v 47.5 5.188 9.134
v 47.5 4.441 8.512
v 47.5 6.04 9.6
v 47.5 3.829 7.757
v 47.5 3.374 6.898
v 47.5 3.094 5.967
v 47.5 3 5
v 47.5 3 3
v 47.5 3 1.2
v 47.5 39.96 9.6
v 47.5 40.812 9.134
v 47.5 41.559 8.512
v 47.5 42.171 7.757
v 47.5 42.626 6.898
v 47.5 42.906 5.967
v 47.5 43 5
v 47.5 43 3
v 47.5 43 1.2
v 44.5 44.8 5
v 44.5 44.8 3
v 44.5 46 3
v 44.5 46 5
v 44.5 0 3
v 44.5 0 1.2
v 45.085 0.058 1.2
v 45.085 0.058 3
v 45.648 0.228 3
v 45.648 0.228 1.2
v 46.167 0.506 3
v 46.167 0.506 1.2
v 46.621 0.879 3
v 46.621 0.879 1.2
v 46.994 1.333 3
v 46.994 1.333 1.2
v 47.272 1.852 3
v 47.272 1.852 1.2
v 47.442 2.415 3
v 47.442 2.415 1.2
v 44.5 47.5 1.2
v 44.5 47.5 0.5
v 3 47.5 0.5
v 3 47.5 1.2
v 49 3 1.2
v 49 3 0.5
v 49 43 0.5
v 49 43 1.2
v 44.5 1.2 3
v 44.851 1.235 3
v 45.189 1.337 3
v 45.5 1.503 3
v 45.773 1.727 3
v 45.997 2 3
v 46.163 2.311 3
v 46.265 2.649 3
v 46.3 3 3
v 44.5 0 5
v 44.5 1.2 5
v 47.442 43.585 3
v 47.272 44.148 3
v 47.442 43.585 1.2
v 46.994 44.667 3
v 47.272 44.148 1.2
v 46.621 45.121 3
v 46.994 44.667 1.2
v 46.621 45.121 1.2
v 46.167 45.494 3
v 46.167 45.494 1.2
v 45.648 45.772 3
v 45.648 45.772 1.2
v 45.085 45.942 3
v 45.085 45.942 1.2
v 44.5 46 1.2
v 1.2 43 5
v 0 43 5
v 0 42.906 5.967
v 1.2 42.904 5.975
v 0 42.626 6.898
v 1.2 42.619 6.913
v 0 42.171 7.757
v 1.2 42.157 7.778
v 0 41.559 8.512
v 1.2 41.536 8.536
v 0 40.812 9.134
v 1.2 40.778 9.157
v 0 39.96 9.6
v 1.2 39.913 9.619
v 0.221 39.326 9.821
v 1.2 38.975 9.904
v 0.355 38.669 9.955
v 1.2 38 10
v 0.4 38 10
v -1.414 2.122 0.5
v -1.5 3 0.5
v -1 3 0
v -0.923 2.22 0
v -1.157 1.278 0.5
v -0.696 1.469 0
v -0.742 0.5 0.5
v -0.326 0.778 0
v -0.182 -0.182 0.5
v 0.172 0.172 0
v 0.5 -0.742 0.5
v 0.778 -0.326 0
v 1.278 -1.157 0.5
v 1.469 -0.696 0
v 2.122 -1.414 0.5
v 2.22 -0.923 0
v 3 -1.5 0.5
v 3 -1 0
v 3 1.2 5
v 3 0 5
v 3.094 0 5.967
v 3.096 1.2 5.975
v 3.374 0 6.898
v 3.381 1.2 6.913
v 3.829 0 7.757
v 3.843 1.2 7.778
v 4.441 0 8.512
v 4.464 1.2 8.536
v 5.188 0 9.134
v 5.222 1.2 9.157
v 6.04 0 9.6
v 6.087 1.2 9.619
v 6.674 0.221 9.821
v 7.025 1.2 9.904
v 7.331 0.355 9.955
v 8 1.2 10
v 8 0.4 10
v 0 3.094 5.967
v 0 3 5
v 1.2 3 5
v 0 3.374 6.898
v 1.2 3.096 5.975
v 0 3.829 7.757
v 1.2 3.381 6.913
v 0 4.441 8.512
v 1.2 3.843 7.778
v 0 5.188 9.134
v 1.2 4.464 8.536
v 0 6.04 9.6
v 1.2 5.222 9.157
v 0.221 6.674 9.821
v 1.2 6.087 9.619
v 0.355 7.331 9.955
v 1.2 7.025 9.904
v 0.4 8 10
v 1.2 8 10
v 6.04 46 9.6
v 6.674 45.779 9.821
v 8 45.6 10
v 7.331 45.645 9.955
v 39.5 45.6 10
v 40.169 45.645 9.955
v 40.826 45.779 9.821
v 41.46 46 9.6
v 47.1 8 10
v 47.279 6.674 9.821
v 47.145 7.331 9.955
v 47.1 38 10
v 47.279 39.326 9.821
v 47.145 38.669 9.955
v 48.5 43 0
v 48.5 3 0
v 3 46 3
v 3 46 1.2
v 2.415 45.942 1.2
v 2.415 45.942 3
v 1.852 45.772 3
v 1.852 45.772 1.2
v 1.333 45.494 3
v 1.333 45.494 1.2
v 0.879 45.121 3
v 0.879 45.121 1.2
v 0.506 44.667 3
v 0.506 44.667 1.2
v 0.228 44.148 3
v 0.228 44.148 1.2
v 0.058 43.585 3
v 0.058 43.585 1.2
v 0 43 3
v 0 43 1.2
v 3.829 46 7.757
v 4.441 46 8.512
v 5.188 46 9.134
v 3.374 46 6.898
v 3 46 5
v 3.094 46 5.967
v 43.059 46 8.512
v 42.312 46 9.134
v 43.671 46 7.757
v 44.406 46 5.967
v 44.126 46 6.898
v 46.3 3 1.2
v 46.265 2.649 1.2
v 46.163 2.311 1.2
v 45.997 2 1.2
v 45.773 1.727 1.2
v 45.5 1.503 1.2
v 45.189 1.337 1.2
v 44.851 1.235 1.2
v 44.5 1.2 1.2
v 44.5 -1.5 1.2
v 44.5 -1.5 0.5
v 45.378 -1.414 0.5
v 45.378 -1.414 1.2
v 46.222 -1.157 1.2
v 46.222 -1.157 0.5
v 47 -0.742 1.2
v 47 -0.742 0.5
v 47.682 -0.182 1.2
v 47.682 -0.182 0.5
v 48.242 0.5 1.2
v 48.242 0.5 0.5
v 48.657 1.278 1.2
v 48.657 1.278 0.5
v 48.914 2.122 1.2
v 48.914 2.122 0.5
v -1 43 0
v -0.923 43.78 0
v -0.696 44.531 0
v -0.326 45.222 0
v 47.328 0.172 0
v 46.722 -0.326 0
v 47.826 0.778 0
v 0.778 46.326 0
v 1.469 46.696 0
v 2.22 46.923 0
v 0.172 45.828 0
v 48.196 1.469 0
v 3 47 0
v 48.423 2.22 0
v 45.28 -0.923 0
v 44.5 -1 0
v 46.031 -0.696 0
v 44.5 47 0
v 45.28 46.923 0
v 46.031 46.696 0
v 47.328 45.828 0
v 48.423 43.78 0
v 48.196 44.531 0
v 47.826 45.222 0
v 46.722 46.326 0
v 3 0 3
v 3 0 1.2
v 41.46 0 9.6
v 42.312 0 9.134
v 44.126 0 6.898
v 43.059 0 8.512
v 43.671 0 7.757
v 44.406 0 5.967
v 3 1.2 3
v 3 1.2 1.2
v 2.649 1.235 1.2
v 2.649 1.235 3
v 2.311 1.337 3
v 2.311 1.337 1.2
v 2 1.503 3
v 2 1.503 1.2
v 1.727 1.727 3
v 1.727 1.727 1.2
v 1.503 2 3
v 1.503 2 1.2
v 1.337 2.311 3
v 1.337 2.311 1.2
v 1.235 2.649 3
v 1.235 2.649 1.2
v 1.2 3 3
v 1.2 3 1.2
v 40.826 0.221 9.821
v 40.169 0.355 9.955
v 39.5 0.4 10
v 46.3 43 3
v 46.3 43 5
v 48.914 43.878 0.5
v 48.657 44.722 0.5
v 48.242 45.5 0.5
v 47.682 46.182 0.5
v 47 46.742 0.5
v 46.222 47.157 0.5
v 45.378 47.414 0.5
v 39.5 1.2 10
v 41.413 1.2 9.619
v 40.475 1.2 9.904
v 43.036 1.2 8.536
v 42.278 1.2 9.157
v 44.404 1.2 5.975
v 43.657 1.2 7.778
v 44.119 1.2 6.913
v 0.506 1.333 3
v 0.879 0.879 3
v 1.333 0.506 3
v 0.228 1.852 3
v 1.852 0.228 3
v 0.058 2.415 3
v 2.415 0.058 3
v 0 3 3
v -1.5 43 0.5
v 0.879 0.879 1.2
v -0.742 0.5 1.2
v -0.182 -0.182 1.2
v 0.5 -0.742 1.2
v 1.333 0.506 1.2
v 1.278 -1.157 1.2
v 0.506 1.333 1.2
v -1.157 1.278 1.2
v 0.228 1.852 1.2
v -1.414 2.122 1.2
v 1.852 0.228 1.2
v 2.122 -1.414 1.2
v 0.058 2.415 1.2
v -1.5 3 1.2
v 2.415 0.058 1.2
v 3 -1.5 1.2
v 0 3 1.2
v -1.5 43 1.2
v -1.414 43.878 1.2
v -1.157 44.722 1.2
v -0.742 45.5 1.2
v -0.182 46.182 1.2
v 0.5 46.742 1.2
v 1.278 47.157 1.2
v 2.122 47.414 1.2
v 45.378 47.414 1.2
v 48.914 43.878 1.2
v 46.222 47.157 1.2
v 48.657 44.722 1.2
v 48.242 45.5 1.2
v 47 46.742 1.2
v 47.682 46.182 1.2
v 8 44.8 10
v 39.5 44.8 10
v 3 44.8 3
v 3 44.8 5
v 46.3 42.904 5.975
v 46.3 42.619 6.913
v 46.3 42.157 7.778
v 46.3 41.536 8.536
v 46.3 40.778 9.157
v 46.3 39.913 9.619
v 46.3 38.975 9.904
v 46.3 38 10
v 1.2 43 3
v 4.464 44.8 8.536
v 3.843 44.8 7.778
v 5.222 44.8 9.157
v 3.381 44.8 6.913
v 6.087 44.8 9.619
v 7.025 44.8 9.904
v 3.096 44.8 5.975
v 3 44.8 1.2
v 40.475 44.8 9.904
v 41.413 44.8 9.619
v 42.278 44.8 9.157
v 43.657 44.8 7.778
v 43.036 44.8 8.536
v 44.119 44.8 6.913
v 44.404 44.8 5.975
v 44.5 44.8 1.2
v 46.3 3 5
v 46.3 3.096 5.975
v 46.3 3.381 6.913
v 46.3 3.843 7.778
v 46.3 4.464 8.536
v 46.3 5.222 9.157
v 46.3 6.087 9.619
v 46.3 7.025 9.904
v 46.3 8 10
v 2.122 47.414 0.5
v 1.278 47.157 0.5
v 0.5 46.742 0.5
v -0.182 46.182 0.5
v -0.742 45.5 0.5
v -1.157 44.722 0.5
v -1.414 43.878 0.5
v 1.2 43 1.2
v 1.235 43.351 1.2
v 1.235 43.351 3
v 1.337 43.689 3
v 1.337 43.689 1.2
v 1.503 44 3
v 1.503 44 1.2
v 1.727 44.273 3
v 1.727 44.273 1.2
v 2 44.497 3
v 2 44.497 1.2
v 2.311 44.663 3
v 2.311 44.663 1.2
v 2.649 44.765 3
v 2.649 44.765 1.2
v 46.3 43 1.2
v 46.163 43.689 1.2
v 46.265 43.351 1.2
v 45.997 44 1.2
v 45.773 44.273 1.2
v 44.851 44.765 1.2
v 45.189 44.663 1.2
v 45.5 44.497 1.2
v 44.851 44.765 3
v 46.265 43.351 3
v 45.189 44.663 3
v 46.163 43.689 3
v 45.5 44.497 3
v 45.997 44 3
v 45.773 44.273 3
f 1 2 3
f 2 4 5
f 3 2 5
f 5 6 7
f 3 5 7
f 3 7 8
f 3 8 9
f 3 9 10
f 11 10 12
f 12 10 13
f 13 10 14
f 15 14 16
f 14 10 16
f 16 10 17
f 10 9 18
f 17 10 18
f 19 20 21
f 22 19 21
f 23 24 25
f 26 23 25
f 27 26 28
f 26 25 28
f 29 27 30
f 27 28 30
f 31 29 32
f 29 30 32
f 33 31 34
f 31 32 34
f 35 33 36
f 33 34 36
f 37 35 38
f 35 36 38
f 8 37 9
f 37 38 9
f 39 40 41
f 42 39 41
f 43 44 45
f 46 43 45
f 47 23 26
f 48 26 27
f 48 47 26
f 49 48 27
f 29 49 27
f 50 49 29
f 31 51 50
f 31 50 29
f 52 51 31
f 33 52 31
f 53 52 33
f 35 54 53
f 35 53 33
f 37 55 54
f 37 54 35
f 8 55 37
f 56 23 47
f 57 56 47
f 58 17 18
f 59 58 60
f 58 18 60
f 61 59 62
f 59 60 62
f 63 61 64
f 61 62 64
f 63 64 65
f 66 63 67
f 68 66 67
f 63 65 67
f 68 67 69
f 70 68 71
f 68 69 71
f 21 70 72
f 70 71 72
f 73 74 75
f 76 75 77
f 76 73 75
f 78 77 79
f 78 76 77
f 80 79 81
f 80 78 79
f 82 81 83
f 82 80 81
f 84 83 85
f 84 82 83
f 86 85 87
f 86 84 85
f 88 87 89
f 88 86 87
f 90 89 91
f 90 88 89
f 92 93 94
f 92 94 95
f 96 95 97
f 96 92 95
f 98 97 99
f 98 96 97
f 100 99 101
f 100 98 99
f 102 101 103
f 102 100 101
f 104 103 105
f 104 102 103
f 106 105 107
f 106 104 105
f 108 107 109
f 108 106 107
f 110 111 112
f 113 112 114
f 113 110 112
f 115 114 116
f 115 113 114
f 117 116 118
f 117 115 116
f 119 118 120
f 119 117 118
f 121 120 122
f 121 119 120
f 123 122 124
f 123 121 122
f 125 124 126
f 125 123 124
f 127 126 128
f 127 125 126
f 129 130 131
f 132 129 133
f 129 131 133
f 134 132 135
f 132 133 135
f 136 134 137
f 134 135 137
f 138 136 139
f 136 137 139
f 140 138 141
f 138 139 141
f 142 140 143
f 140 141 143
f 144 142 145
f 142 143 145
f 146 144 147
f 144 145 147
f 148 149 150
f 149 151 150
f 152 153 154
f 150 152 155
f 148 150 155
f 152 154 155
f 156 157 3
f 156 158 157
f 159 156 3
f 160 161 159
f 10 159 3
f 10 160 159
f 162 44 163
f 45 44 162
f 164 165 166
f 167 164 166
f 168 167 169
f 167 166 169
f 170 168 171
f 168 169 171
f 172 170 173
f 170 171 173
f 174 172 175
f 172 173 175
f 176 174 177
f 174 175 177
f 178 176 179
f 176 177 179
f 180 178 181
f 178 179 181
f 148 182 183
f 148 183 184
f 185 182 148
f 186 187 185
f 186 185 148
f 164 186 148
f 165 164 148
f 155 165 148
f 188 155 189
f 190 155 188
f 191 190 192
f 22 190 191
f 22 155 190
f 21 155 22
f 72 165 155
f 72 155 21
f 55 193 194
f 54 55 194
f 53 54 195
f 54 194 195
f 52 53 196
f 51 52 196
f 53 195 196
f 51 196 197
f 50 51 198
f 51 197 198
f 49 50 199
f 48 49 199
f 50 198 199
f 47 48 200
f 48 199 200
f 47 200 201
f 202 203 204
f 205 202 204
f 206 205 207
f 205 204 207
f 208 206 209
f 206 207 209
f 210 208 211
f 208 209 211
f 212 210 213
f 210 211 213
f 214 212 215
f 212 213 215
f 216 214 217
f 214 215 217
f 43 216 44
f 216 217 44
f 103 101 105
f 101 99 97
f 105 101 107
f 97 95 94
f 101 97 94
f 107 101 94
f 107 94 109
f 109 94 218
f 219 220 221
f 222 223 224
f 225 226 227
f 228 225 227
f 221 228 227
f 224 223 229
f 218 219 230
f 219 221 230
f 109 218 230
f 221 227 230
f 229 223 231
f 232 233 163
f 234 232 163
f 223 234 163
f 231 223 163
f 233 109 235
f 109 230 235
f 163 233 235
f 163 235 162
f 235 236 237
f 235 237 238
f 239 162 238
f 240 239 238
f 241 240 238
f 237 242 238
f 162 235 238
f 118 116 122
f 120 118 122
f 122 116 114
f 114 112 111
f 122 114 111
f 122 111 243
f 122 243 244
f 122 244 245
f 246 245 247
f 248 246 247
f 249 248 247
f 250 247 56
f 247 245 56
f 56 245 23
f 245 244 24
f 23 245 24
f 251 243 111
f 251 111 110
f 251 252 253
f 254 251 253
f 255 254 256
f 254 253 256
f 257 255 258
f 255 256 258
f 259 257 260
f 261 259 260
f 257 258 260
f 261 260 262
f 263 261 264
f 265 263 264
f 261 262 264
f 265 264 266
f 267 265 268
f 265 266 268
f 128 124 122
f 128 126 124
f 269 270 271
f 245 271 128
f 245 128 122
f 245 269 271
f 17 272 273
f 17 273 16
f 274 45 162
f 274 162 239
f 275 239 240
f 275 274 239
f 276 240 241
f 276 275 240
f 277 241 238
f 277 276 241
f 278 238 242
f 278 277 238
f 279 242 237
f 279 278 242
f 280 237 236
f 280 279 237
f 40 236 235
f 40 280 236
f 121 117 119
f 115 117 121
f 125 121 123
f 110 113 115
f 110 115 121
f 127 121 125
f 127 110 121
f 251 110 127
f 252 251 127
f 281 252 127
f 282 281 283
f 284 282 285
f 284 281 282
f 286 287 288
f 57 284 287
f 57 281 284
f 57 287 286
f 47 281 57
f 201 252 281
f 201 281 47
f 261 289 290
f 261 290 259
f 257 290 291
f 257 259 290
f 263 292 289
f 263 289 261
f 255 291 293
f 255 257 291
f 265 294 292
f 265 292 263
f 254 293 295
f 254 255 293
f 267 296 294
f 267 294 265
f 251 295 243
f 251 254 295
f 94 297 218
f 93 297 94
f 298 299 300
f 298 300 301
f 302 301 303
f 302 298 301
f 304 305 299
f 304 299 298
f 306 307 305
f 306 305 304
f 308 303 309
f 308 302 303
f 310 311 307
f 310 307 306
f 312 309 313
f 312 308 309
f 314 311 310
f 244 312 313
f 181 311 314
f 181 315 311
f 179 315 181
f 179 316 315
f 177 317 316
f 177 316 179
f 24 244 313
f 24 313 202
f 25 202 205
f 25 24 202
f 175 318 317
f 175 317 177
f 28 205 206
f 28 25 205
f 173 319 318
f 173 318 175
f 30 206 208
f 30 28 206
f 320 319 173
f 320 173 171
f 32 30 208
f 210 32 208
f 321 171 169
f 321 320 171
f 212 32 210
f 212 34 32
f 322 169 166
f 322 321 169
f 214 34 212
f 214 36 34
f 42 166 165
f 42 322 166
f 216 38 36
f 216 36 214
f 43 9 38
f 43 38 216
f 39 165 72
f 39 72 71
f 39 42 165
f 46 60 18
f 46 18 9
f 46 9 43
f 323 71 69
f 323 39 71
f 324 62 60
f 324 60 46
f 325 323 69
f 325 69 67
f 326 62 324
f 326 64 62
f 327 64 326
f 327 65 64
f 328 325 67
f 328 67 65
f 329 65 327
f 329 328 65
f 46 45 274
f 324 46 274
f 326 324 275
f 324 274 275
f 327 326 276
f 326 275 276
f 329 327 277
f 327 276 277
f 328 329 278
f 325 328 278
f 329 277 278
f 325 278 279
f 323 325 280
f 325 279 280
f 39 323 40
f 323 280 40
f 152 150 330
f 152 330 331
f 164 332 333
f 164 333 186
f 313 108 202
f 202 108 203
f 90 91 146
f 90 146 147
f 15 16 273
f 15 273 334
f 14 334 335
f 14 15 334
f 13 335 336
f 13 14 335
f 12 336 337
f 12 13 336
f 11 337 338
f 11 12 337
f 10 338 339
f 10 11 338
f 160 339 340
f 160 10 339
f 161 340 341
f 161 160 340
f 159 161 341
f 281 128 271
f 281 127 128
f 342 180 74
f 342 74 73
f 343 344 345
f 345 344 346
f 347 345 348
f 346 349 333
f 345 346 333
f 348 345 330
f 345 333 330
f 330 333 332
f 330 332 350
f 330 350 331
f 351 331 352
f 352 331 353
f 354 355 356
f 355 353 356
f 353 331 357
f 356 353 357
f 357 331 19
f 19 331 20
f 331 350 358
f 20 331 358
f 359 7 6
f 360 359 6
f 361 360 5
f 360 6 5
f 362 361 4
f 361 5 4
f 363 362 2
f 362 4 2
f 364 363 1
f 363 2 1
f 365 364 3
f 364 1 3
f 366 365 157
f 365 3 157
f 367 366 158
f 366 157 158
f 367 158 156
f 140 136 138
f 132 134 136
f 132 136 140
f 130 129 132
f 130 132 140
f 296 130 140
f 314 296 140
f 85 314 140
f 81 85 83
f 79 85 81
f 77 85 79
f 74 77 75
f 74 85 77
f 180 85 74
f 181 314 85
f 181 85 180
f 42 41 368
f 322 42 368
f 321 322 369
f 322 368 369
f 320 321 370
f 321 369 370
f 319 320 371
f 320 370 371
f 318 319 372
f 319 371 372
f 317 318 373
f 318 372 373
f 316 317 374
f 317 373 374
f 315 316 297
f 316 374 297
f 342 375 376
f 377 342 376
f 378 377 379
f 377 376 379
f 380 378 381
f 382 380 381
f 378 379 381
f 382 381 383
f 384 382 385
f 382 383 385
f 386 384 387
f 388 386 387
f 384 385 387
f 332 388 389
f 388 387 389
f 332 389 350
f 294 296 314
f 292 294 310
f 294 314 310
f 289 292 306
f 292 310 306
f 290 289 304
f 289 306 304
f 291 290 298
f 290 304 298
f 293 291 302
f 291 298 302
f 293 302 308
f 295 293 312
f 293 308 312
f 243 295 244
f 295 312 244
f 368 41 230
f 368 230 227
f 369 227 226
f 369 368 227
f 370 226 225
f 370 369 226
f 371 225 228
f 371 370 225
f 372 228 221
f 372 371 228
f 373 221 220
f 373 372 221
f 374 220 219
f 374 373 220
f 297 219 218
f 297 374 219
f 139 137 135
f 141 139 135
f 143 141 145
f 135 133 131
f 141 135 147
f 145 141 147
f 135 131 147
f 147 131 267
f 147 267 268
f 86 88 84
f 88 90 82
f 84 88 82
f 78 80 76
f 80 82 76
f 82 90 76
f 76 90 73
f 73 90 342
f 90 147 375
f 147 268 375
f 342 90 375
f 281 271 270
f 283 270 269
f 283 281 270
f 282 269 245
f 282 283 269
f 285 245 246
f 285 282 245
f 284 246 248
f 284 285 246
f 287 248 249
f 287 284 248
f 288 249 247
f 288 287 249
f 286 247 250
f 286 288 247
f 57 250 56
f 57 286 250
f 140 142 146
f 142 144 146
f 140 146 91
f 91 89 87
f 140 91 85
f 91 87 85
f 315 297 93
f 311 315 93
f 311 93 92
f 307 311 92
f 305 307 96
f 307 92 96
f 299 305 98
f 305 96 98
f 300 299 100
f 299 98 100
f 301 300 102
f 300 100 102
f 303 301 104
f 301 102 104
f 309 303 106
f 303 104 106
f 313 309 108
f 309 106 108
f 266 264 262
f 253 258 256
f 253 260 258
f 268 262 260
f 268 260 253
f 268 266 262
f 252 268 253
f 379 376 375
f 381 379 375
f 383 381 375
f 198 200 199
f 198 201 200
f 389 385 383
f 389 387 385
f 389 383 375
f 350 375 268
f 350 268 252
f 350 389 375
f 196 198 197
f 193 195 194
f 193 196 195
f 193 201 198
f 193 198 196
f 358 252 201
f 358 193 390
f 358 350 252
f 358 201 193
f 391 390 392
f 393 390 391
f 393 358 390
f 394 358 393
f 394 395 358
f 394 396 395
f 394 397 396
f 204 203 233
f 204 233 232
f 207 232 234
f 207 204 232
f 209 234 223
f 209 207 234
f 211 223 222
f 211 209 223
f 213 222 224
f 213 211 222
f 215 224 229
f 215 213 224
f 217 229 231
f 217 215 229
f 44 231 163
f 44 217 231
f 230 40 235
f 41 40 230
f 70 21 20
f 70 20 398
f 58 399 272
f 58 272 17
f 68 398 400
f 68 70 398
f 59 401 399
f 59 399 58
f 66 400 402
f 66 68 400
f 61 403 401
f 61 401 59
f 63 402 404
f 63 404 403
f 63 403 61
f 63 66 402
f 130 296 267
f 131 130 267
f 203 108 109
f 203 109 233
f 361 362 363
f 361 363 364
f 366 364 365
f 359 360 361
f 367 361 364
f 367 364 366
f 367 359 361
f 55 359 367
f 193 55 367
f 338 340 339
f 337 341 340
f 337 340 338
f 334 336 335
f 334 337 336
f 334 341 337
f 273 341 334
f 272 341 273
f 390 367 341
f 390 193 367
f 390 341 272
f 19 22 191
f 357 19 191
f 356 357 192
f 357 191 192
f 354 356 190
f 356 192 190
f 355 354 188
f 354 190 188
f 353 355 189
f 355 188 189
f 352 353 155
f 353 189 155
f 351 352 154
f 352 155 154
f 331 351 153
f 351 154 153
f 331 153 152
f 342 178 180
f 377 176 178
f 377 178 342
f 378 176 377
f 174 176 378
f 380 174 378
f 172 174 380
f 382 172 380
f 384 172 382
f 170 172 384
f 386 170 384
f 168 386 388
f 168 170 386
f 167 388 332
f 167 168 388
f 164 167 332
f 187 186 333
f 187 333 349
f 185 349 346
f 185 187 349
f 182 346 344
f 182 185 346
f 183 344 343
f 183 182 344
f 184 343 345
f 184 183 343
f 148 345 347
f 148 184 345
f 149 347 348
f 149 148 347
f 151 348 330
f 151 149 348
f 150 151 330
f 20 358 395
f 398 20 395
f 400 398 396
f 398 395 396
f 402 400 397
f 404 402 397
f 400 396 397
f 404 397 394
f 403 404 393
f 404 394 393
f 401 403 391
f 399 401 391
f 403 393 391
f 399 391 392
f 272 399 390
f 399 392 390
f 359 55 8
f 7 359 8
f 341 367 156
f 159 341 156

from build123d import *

# Parameters (mm, degrees)
F1_DEPTH = 1.2
F2_W     = 1.2
F2_H     = 40
F2_W_2   = 41.5
F2_H_2   = 1.2
F3_DEPTH = 10
F4_SIZE  = 0.4
F5_R     = 5
F6_DEPTH = 3
F7_SIZE  = 0.5


with BuildPart() as f1:
    # F0 (on Top) → F1 (new body)
    with BuildSketch(Plane.XY):
        with BuildLine():
            Line((44.5, 47.5), (3, 47.5))
            ThreePointArc((3, 47.5), (-0.181981, 46.181981), (-1.5, 43))
            Line((-1.5, 43), (-1.5, 3))
            ThreePointArc((-1.5, 3), (-0.181981, -0.181981), (3, -1.5))
            Line((3, -1.5), (44.5, -1.5))
            ThreePointArc((44.5, -1.5), (47.681981, -0.181981), (49, 3))
            Line((49, 3), (49, 43))
            ThreePointArc((49, 43), (47.681981, 46.181981), (44.5, 47.5))
        make_face()
        with BuildLine():
            Line((44.5, 0), (3, 0))
            ThreePointArc((3, 0), (0.87868, 0.87868), (0, 3))
            Line((0, 3), (0, 43))
            ThreePointArc((0, 43), (0.87868, 45.12132), (3, 46))
            Line((3, 46), (44.5, 46))
            ThreePointArc((44.5, 46), (46.62132, 45.12132), (47.5, 43))
            Line((47.5, 43), (47.5, 3))
            ThreePointArc((47.5, 3), (46.62132, 0.87868), (44.5, 0))
        make_face(mode=Mode.SUBTRACT)
        with BuildLine():
            ThreePointArc((0, 3), (0.87868, 0.87868), (3, 0))
            Line((3, 0), (44.5, 0))
            ThreePointArc((44.5, 0), (46.62132, 0.87868), (47.5, 3))
            Line((47.5, 3), (47.5, 43))
            ThreePointArc((47.5, 43), (46.62132, 45.12132), (44.5, 46))
            Line((44.5, 46), (3, 46))
            ThreePointArc((3, 46), (0.87868, 45.12132), (0, 43))
            Line((0, 43), (0, 3))
        make_face()
    extrude(amount=F1_DEPTH)

    # F2 (on face) → F3 (join)
    with BuildSketch(Plane.XY):
        with Locations((0.6, 23)):
            Rectangle(F2_W, F2_H)
        with Locations((46.9, 23)):
            Rectangle(F2_W, F2_H)
        with Locations((23.75, 0.6)):
            Rectangle(F2_W_2, F2_H_2)
        with Locations((23.75, 45.4)):
            Rectangle(F2_W_2, F2_H_2)
    extrude(amount=F3_DEPTH)

    # F4
    f4_edges = [f1.edges().sort_by_distance(p)[0] for p in [
        (47.5, 23, 10),
        (23.75, 46, 10),
        (0, 23, 10),
        (23.75, 0, 10),
    ]]
    chamfer(f4_edges, length=F4_SIZE)

    # F5
    f5_edges = [f1.edges().sort_by_distance(p)[0] for p in [
        (46.7, 43, 10),
        (44.5, 45.2, 10),
        (3, 45.2, 10),
        (0.8, 43, 10),
        (3, 0.8, 10),
        (0.8, 3, 10),
        (46.7, 3, 10),
        (44.5, 0.8, 10),
    ]]
    fillet(f5_edges, radius=F5_R)

    # F2 (on face) → F6 (join)
    with BuildSketch(Plane.XY):
        with BuildLine():
            Line((0, 43), (1.2, 43))
            ThreePointArc((1.2, 43), (1.727208, 44.272792), (3, 44.8))
            Line((3, 44.8), (3, 46))
            ThreePointArc((3, 46), (0.87868, 45.12132), (0, 43))
        make_face()
        with BuildLine():
            ThreePointArc((3, 1.2), (1.727208, 1.727208), (1.2, 3))
            Line((1.2, 3), (0, 3))
            ThreePointArc((0, 3), (0.87868, 0.87868), (3, 0))
            Line((3, 0), (3, 1.2))
        make_face()
        with BuildLine():
            ThreePointArc((46.3, 3), (45.772792, 1.727208), (44.5, 1.2))
            Line((44.5, 1.2), (44.5, 0))
            ThreePointArc((44.5, 0), (46.62132, 0.87868), (47.5, 3))
            Line((47.5, 3), (46.3, 3))
        make_face()
        with BuildLine():
            Line((44.5, 46), (44.5, 44.8))
            ThreePointArc((44.5, 44.8), (45.772792, 44.272792), (46.3, 43))
            Line((46.3, 43), (47.5, 43))
            ThreePointArc((47.5, 43), (46.62132, 45.12132), (44.5, 46))
        make_face()
    extrude(amount=F6_DEPTH)

    # F7
    f7_edges = [f1.edges().sort_by_distance(p)[0] for p in [
        (49, 23, 0),
        (47.681981, 46.181981, 0),
        (23.75, 47.5, 0),
        (-0.181981, 46.181981, 0),
        (-1.5, 23, 0),
        (-0.181981, -0.181981, 0),
        (23.75, -1.5, 0),
        (47.681981, -0.181981, 0),
    ]]
    chamfer(f7_edges, length=F7_SIZE)


solid = f1.part
